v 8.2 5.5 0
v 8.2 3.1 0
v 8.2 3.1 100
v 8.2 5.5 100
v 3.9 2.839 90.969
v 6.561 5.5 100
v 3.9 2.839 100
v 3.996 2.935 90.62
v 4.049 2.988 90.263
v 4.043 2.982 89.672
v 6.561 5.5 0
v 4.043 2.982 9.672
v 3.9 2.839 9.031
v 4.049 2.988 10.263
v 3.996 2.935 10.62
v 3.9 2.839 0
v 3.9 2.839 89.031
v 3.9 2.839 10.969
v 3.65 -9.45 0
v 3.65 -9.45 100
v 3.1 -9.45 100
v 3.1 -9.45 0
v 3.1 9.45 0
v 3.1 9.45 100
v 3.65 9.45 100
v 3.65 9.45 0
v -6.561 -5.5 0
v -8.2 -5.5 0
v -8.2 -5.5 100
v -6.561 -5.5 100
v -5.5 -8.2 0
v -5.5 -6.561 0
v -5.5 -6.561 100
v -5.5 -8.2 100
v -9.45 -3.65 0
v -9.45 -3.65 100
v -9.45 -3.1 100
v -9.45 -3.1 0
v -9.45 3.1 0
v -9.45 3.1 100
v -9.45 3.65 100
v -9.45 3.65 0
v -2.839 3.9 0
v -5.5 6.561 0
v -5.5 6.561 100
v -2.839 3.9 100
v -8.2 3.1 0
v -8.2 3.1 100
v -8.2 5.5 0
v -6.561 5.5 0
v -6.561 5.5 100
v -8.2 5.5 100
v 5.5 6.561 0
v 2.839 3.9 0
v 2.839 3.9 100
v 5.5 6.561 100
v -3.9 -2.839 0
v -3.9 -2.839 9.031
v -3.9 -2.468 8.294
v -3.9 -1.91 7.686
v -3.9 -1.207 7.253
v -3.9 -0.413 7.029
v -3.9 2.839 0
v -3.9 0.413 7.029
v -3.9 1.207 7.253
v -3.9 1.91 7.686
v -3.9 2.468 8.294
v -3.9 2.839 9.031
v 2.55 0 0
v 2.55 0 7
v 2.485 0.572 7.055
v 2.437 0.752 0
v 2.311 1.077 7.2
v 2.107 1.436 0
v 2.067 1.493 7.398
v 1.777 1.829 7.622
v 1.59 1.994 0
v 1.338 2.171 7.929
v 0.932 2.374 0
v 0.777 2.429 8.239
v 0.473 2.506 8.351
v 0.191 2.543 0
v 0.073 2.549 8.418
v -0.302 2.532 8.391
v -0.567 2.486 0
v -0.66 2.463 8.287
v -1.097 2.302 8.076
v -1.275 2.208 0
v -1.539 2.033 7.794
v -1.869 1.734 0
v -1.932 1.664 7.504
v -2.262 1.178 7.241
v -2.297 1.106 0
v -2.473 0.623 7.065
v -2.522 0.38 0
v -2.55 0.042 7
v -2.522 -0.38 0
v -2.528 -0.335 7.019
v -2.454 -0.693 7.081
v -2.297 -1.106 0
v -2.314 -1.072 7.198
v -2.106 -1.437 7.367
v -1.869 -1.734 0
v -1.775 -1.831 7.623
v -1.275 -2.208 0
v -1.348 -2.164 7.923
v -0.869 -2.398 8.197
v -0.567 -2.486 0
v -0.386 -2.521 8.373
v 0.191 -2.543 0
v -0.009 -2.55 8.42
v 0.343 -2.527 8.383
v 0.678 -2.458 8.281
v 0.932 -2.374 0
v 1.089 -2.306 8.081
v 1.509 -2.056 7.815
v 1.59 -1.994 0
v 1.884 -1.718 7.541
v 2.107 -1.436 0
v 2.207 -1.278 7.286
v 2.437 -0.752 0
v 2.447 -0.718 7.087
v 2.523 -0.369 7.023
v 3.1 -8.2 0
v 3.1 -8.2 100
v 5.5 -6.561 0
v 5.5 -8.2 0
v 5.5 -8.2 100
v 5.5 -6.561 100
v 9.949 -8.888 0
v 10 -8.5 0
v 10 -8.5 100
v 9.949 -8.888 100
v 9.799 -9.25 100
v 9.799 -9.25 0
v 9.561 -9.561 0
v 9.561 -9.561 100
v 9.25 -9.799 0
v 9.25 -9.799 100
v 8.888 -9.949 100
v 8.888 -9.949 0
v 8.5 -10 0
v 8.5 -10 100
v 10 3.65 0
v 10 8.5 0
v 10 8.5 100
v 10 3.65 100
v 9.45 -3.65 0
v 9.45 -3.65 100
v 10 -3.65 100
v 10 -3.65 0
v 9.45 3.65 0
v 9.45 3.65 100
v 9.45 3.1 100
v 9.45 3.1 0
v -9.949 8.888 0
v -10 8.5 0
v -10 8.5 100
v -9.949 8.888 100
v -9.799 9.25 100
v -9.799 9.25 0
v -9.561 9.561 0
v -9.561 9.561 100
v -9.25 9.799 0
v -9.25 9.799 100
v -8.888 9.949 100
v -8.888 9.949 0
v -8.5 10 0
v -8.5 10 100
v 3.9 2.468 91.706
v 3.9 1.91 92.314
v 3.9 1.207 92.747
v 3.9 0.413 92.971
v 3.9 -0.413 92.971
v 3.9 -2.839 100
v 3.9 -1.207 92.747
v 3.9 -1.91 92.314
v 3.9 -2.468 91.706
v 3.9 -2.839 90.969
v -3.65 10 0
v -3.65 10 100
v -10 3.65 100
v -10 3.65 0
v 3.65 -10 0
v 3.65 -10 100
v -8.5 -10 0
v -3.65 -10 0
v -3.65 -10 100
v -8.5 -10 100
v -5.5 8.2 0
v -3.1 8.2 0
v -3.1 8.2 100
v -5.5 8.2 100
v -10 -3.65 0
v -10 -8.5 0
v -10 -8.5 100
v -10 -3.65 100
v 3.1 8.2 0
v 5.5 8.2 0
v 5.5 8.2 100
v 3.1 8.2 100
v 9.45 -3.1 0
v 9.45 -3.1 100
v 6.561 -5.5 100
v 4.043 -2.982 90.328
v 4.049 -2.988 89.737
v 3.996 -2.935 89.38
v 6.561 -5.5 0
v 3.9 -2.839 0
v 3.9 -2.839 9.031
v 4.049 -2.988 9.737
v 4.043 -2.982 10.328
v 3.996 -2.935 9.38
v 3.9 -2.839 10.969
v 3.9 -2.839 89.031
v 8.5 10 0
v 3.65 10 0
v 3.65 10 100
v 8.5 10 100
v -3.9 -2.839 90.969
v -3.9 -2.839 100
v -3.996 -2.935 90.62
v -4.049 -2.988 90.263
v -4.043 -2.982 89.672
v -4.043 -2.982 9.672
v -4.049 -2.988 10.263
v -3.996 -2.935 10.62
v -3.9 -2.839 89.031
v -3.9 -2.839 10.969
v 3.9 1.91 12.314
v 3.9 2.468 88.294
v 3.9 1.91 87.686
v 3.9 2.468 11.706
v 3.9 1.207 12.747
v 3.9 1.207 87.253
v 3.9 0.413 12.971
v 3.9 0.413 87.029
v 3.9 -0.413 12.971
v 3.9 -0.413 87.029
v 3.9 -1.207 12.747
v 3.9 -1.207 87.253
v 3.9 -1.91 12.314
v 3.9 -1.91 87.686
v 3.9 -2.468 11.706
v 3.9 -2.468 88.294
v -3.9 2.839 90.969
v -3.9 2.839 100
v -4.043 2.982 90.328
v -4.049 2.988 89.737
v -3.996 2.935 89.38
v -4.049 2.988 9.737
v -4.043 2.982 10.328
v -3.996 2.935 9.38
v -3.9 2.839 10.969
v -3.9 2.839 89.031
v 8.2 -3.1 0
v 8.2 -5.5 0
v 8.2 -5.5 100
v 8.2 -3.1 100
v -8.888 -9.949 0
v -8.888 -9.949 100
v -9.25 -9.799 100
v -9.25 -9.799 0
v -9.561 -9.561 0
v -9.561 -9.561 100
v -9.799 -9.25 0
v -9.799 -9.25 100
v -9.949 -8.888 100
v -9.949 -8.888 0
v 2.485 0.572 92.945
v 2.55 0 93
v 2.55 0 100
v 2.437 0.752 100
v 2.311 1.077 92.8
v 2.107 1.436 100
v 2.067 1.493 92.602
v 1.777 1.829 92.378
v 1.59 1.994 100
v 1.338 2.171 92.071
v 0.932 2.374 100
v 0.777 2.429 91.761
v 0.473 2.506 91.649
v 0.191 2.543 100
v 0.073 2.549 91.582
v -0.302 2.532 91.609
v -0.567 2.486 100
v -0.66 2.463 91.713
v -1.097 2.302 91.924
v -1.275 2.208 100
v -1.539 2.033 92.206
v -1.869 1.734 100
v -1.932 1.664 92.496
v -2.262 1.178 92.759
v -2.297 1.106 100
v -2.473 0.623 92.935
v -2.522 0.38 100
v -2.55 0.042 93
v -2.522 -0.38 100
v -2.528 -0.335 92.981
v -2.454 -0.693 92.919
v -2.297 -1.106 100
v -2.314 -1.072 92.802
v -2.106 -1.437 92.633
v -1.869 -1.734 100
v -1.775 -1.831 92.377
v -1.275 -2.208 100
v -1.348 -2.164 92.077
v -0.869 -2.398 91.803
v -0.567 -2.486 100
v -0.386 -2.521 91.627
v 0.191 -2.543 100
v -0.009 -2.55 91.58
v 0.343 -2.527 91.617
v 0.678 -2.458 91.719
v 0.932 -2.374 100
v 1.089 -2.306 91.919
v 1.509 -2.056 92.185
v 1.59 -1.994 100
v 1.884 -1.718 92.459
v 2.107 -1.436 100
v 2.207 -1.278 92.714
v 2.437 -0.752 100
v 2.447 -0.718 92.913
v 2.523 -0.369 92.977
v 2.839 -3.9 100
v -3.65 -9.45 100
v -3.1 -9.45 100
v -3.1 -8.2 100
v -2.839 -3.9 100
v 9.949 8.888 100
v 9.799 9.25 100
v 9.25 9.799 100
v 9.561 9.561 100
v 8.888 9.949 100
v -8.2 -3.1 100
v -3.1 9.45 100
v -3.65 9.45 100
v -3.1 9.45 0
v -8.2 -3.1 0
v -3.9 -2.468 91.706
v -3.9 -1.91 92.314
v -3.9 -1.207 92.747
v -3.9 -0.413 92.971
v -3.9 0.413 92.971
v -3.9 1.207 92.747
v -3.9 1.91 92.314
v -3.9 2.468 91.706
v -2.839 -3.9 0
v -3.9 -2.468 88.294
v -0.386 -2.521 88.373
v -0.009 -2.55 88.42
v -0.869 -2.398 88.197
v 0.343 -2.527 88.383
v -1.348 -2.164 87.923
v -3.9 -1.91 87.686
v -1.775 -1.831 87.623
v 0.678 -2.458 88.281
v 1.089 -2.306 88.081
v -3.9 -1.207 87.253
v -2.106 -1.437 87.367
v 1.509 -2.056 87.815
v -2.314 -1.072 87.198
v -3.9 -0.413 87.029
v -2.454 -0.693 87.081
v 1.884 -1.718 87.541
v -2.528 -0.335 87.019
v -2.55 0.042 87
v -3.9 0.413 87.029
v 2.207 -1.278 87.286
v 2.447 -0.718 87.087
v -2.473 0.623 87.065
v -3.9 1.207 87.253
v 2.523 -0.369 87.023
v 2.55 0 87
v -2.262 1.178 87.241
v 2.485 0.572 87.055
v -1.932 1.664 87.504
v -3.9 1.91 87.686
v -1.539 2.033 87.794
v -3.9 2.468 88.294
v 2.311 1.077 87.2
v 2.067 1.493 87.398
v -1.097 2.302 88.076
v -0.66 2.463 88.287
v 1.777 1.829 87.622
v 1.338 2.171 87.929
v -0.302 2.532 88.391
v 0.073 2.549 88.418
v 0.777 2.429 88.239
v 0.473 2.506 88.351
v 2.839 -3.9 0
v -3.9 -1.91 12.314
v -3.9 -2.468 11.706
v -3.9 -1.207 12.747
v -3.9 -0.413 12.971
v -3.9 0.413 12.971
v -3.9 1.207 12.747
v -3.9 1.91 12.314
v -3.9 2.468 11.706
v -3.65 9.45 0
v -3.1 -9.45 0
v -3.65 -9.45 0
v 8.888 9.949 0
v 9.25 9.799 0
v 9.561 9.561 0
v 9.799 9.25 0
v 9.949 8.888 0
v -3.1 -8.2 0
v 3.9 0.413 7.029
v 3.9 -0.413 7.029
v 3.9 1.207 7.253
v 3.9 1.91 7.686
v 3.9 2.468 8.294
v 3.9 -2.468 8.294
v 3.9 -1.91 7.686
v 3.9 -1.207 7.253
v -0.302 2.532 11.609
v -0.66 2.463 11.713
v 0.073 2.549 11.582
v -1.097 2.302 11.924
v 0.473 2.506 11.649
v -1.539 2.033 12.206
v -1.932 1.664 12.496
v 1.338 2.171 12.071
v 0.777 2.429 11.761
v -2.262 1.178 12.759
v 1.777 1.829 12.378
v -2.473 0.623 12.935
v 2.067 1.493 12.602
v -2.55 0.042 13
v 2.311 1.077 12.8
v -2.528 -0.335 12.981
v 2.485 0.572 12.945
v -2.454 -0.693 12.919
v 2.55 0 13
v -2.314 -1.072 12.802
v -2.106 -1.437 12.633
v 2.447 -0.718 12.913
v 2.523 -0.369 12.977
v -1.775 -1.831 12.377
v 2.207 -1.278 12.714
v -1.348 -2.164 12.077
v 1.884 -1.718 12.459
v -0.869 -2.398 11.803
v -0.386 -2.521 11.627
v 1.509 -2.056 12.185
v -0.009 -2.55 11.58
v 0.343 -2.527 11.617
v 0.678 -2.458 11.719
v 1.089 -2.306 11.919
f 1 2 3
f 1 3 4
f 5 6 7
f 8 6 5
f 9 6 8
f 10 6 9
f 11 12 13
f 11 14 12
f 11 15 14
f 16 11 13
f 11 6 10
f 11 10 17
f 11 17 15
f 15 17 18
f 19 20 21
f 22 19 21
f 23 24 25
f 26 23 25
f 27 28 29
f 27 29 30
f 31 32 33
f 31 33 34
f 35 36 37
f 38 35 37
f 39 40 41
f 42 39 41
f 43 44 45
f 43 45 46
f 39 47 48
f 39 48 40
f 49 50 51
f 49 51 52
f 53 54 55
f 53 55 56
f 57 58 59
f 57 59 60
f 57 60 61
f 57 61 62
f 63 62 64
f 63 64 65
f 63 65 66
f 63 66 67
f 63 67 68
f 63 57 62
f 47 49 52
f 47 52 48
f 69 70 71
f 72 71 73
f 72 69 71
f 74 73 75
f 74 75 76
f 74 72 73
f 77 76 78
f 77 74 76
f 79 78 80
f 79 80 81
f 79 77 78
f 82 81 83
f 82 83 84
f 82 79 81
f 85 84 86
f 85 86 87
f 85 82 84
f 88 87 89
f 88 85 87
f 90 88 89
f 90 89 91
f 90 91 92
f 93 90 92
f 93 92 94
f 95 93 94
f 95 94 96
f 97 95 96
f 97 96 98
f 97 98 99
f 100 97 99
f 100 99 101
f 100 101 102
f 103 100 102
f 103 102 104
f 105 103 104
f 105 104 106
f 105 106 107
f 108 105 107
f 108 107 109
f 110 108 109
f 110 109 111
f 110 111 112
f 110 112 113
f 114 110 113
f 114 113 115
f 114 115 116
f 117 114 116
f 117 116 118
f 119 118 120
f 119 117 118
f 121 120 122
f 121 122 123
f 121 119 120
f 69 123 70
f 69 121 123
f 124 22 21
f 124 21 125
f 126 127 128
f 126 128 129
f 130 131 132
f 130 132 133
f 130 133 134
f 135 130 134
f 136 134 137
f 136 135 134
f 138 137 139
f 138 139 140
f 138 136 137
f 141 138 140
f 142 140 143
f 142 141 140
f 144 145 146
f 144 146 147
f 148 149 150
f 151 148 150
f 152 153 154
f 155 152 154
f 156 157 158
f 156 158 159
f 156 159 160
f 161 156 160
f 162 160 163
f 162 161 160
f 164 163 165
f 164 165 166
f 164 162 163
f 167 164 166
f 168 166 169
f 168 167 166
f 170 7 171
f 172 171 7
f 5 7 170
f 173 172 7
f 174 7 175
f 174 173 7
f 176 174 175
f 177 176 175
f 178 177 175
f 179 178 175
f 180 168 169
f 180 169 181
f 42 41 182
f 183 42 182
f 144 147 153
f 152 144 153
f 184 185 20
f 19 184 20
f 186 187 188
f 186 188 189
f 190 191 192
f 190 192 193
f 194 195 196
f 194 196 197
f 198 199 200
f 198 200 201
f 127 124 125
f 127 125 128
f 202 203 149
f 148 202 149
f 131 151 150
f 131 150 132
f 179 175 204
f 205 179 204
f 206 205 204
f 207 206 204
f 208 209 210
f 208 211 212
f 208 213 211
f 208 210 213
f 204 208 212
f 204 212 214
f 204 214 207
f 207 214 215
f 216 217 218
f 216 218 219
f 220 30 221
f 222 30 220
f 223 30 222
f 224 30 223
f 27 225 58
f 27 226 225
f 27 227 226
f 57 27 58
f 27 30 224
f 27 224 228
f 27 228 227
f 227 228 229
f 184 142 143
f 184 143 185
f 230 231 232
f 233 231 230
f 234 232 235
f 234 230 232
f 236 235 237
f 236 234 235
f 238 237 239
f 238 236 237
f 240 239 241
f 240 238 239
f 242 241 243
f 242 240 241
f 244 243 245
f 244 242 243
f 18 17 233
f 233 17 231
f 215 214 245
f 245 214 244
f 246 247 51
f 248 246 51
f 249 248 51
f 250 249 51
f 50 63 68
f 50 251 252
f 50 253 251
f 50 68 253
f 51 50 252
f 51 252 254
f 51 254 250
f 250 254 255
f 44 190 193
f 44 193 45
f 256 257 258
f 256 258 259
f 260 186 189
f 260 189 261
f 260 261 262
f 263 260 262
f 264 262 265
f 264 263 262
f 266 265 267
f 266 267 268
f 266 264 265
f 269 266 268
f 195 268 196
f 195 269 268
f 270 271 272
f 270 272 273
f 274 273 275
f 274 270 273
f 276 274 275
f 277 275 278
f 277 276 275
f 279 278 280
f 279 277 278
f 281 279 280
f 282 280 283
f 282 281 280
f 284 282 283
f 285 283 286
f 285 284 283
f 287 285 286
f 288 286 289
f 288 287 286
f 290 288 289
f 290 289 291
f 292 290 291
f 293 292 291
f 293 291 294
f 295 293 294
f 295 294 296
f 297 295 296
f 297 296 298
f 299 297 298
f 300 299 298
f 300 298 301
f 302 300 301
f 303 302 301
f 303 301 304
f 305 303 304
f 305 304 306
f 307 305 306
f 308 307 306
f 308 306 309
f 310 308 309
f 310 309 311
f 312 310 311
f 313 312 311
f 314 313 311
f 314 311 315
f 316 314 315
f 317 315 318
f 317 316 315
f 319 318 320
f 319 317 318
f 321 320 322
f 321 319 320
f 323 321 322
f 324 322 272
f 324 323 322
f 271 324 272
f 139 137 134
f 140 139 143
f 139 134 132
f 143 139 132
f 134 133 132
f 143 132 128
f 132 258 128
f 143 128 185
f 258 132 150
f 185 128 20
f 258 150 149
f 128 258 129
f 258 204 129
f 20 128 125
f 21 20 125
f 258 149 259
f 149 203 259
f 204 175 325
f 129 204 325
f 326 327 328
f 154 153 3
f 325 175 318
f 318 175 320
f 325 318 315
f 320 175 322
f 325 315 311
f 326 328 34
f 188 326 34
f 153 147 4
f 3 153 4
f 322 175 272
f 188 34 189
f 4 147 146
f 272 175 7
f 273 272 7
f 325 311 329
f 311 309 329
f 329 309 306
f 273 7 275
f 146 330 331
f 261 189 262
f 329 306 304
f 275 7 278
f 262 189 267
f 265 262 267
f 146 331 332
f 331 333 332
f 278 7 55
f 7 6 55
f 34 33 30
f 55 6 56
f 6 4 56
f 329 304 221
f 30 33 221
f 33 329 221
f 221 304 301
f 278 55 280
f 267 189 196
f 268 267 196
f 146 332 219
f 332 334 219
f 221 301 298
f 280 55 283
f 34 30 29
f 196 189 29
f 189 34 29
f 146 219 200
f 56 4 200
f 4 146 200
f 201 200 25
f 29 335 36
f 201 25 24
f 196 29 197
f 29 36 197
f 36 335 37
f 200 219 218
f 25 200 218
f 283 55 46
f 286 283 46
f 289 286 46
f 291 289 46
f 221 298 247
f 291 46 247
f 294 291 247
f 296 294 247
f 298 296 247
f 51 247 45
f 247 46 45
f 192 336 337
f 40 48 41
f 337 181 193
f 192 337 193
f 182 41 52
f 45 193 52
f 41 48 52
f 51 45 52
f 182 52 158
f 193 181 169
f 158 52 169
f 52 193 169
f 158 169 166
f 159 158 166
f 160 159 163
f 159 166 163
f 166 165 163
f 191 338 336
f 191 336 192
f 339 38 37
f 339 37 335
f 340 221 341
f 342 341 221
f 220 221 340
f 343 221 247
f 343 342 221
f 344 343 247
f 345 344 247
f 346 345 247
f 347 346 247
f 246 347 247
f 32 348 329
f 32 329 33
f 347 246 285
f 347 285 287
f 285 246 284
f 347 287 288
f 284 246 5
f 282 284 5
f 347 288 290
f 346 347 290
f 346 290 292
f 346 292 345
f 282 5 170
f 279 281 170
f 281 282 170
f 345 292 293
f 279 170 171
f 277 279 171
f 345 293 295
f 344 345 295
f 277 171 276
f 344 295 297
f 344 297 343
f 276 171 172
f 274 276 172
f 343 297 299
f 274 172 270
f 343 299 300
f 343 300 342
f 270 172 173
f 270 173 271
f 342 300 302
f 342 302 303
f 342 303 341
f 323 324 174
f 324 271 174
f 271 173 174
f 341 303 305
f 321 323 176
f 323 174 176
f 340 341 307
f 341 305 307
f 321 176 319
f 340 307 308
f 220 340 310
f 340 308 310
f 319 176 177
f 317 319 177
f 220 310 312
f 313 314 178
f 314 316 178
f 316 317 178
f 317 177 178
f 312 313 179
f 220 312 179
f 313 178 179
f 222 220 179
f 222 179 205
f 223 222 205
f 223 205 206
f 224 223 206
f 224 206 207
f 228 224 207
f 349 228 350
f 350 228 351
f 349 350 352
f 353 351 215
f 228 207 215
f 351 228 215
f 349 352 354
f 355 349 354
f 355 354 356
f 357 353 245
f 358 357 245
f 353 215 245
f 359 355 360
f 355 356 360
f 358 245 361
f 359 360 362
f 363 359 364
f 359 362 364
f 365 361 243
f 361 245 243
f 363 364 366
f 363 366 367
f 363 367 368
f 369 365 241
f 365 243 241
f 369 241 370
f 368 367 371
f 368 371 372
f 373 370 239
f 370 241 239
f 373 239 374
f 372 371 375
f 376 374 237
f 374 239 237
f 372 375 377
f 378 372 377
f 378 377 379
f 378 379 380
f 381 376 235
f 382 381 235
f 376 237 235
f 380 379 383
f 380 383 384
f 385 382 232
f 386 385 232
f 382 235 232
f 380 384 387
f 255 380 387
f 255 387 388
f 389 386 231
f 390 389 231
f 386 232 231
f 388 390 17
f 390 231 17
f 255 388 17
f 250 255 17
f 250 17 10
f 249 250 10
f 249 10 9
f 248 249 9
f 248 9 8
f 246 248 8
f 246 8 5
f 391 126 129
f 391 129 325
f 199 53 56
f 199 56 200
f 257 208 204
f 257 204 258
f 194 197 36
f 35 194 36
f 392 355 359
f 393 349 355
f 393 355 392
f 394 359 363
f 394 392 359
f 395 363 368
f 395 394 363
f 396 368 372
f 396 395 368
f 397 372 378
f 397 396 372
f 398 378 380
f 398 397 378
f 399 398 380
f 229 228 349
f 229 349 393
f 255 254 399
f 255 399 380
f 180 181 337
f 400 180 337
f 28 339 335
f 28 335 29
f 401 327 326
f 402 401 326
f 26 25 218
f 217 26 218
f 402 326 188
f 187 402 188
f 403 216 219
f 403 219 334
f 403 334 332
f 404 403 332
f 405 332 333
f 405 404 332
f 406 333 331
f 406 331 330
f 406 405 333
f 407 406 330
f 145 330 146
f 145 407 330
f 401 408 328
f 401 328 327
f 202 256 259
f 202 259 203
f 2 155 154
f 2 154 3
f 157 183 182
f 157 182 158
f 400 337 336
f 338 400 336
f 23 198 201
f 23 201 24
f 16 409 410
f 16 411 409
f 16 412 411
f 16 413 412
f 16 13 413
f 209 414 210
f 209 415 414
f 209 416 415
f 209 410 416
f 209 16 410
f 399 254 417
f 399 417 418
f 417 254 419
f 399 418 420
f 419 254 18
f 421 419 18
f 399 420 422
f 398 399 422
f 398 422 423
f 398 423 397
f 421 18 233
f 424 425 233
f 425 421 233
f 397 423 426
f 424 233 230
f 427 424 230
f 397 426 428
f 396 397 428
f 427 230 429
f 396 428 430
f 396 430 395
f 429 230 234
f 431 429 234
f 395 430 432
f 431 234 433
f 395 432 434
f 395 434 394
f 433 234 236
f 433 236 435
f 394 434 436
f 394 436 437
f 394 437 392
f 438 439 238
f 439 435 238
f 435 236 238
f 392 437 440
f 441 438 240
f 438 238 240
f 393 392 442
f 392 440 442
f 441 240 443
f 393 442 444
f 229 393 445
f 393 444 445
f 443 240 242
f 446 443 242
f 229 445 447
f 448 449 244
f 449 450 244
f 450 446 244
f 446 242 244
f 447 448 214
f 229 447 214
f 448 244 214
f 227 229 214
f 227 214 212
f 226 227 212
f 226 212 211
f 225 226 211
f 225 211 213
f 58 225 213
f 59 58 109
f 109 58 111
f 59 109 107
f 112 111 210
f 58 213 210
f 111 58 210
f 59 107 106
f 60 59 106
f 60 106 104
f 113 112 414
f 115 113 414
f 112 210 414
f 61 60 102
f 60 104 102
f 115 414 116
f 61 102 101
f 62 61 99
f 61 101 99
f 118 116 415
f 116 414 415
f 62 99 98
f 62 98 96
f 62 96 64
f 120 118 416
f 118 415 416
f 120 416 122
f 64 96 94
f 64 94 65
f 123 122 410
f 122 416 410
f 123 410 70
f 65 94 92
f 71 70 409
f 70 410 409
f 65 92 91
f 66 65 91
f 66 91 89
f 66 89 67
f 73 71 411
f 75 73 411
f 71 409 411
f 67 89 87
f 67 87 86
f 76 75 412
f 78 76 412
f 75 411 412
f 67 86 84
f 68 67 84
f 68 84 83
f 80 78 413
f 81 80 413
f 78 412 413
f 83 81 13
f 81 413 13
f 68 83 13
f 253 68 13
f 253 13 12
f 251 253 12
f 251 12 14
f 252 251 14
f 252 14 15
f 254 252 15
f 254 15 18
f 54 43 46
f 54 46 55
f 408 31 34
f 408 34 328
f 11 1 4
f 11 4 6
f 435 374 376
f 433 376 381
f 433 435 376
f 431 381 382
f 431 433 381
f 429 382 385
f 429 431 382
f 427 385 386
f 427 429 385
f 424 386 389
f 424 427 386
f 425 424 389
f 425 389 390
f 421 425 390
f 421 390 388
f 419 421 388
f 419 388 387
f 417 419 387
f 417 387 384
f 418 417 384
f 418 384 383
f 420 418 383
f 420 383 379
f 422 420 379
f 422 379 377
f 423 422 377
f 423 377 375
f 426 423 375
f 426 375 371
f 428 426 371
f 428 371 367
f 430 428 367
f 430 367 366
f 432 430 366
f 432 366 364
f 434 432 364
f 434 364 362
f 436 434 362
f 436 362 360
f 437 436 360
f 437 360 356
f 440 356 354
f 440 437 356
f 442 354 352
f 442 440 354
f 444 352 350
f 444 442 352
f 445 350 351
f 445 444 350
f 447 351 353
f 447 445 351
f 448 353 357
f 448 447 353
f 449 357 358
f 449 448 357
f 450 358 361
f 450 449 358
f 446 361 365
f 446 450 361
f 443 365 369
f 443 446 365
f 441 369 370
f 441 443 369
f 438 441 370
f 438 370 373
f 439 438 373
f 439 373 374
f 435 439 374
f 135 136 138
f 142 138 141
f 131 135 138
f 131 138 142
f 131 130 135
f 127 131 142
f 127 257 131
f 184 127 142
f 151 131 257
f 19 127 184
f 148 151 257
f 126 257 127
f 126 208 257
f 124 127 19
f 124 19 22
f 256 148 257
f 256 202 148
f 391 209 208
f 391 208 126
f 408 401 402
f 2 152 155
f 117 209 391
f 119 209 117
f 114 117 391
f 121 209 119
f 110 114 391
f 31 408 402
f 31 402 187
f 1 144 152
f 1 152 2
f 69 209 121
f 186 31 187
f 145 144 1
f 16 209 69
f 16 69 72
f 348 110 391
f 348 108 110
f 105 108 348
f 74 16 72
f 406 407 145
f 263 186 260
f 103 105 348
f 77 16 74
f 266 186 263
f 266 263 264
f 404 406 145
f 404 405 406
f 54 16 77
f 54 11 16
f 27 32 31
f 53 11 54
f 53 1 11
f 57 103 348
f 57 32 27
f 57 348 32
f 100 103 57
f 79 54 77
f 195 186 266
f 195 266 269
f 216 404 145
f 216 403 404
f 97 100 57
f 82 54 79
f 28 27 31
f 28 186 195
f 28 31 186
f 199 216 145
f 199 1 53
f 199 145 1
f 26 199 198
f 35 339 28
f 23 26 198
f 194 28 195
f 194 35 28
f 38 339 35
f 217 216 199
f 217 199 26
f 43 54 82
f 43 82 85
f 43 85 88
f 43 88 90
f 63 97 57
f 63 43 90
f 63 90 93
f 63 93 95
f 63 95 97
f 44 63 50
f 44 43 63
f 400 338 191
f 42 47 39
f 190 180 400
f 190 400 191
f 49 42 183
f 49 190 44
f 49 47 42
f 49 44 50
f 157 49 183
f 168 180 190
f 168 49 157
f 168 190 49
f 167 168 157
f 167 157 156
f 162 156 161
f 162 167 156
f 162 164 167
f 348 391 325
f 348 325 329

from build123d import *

# Parameters (mm, degrees)
SKETCH_2_R          = 2.55
EXTRUDE_1_DEPTH     = 100
SKETCH_3_R          = 3
CUT_EXTRUDE_1_DEPTH = 103.46950766


with BuildPart() as part:
    # 草图2 → 凸台-拉伸1 (new body)
    with BuildSketch(Plane.XY):
        with BuildLine():
            Line((-3.9, 2.839339828), (-6.560660172, 5.5))
            Line((-6.560660172, 5.5), (-8.2, 5.5))
            Line((-8.2, 5.5), (-8.2, 3.1))
            Line((-8.2, 3.1), (-9.45, 3.1))
            Line((-9.45, 3.1), (-9.45, 3.65))
            Line((-9.45, 3.65), (-10, 3.65))
            Line((-10, 3.65), (-10, 8.5))
            ThreePointArc((-10, 8.5), (-9.560660172, 9.560660172), (-8.5, 10))
            Line((-8.5, 10), (-3.65, 10))
            Line((-3.65, 10), (-3.65, 9.45))
            Line((-3.65, 9.45), (-3.1, 9.45))
            Line((-3.1, 9.45), (-3.1, 8.2))
            Line((-3.1, 8.2), (-5.5, 8.2))
            Line((-5.5, 8.2), (-5.5, 6.560660172))
            Line((-5.5, 6.560660172), (-2.839339828, 3.9))
            Line((-2.839339828, 3.9), (2.839339828, 3.9))
            Line((2.839339828, 3.9), (5.5, 6.560660172))
            Line((5.5, 6.560660172), (5.5, 8.2))
            Line((5.5, 8.2), (3.1, 8.2))
            Line((3.1, 8.2), (3.1, 9.45))
            Line((3.1, 9.45), (3.65, 9.45))
            Line((3.65, 9.45), (3.65, 10))
            Line((3.65, 10), (8.5, 10))
            ThreePointArc((8.5, 10), (9.560660172, 9.560660172), (10, 8.5))
            Line((10, 8.5), (10, 3.65))
            Line((10, 3.65), (9.45, 3.65))
            Line((9.45, 3.65), (9.45, 3.1))
            Line((9.45, 3.1), (8.2, 3.1))
            Line((8.2, 3.1), (8.2, 5.5))
            Line((8.2, 5.5), (6.560660172, 5.5))
            Line((6.560660172, 5.5), (3.9, 2.839339828))
            Line((3.9, 2.839339828), (3.9, -2.839339828))
            Line((3.9, -2.839339828), (6.560660172, -5.5))
            Line((6.560660172, -5.5), (8.2, -5.5))
            Line((8.2, -5.5), (8.2, -3.1))
            Line((8.2, -3.1), (9.45, -3.1))
            Line((9.45, -3.1), (9.45, -3.65))
            Line((9.45, -3.65), (10, -3.65))
            Line((10, -3.65), (10, -8.5))
            ThreePointArc((10, -8.5), (9.560660172, -9.560660172), (8.5, -10))
            Line((8.5, -10), (3.65, -10))
            Line((3.65, -10), (3.65, -9.45))
            Line((3.65, -9.45), (3.1, -9.45))
            Line((3.1, -9.45), (3.1, -8.2))
            Line((3.1, -8.2), (5.5, -8.2))
            Line((5.5, -8.2), (5.5, -6.560660172))
            Line((5.5, -6.560660172), (2.839339828, -3.9))
            Line((2.839339828, -3.9), (-2.839339828, -3.9))
            Line((-2.839339828, -3.9), (-5.5, -6.560660172))
            Line((-5.5, -6.560660172), (-5.5, -8.2))
            Line((-5.5, -8.2), (-3.1, -8.2))
            Line((-3.1, -8.2), (-3.1, -9.45))
            Line((-3.1, -9.45), (-3.65, -9.45))
            Line((-3.65, -9.45), (-3.65, -10))
            Line((-3.65, -10), (-8.5, -10))
            ThreePointArc((-8.5, -10), (-9.560660172, -9.560660172), (-10, -8.5))
            Line((-10, -8.5), (-10, -3.65))
            Line((-10, -3.65), (-9.45, -3.65))
            Line((-9.45, -3.65), (-9.45, -3.1))
            Line((-9.45, -3.1), (-8.2, -3.1))
            Line((-8.2, -3.1), (-8.2, -5.5))
            Line((-8.2, -5.5), (-6.560660172, -5.5))
            Line((-6.560660172, -5.5), (-3.9, -2.839339828))
            Line((-3.9, -2.839339828), (-3.9, 2.839339828))
        make_face()
        Circle(SKETCH_2_R, mode=Mode.SUBTRACT)
    extrude(amount=EXTRUDE_1_DEPTH)

    # 草图3 → 切除-拉伸1 (cut, through all)
    with BuildSketch(Plane(origin=(10, 0, 0), x_dir=(0, 0, -1), z_dir=(1, 0, 0))):
        with Locations(Location((-90, 0, 0), (0, 0, 108.835996158))):
            Circle(SKETCH_3_R)
        with Locations(Location((-10, 0, 0), (0, 0, 108.835996158))):
            Circle(SKETCH_3_R)
    extrude(amount=-CUT_EXTRUDE_1_DEPTH, mode=Mode.SUBTRACT)


solid = part.part
